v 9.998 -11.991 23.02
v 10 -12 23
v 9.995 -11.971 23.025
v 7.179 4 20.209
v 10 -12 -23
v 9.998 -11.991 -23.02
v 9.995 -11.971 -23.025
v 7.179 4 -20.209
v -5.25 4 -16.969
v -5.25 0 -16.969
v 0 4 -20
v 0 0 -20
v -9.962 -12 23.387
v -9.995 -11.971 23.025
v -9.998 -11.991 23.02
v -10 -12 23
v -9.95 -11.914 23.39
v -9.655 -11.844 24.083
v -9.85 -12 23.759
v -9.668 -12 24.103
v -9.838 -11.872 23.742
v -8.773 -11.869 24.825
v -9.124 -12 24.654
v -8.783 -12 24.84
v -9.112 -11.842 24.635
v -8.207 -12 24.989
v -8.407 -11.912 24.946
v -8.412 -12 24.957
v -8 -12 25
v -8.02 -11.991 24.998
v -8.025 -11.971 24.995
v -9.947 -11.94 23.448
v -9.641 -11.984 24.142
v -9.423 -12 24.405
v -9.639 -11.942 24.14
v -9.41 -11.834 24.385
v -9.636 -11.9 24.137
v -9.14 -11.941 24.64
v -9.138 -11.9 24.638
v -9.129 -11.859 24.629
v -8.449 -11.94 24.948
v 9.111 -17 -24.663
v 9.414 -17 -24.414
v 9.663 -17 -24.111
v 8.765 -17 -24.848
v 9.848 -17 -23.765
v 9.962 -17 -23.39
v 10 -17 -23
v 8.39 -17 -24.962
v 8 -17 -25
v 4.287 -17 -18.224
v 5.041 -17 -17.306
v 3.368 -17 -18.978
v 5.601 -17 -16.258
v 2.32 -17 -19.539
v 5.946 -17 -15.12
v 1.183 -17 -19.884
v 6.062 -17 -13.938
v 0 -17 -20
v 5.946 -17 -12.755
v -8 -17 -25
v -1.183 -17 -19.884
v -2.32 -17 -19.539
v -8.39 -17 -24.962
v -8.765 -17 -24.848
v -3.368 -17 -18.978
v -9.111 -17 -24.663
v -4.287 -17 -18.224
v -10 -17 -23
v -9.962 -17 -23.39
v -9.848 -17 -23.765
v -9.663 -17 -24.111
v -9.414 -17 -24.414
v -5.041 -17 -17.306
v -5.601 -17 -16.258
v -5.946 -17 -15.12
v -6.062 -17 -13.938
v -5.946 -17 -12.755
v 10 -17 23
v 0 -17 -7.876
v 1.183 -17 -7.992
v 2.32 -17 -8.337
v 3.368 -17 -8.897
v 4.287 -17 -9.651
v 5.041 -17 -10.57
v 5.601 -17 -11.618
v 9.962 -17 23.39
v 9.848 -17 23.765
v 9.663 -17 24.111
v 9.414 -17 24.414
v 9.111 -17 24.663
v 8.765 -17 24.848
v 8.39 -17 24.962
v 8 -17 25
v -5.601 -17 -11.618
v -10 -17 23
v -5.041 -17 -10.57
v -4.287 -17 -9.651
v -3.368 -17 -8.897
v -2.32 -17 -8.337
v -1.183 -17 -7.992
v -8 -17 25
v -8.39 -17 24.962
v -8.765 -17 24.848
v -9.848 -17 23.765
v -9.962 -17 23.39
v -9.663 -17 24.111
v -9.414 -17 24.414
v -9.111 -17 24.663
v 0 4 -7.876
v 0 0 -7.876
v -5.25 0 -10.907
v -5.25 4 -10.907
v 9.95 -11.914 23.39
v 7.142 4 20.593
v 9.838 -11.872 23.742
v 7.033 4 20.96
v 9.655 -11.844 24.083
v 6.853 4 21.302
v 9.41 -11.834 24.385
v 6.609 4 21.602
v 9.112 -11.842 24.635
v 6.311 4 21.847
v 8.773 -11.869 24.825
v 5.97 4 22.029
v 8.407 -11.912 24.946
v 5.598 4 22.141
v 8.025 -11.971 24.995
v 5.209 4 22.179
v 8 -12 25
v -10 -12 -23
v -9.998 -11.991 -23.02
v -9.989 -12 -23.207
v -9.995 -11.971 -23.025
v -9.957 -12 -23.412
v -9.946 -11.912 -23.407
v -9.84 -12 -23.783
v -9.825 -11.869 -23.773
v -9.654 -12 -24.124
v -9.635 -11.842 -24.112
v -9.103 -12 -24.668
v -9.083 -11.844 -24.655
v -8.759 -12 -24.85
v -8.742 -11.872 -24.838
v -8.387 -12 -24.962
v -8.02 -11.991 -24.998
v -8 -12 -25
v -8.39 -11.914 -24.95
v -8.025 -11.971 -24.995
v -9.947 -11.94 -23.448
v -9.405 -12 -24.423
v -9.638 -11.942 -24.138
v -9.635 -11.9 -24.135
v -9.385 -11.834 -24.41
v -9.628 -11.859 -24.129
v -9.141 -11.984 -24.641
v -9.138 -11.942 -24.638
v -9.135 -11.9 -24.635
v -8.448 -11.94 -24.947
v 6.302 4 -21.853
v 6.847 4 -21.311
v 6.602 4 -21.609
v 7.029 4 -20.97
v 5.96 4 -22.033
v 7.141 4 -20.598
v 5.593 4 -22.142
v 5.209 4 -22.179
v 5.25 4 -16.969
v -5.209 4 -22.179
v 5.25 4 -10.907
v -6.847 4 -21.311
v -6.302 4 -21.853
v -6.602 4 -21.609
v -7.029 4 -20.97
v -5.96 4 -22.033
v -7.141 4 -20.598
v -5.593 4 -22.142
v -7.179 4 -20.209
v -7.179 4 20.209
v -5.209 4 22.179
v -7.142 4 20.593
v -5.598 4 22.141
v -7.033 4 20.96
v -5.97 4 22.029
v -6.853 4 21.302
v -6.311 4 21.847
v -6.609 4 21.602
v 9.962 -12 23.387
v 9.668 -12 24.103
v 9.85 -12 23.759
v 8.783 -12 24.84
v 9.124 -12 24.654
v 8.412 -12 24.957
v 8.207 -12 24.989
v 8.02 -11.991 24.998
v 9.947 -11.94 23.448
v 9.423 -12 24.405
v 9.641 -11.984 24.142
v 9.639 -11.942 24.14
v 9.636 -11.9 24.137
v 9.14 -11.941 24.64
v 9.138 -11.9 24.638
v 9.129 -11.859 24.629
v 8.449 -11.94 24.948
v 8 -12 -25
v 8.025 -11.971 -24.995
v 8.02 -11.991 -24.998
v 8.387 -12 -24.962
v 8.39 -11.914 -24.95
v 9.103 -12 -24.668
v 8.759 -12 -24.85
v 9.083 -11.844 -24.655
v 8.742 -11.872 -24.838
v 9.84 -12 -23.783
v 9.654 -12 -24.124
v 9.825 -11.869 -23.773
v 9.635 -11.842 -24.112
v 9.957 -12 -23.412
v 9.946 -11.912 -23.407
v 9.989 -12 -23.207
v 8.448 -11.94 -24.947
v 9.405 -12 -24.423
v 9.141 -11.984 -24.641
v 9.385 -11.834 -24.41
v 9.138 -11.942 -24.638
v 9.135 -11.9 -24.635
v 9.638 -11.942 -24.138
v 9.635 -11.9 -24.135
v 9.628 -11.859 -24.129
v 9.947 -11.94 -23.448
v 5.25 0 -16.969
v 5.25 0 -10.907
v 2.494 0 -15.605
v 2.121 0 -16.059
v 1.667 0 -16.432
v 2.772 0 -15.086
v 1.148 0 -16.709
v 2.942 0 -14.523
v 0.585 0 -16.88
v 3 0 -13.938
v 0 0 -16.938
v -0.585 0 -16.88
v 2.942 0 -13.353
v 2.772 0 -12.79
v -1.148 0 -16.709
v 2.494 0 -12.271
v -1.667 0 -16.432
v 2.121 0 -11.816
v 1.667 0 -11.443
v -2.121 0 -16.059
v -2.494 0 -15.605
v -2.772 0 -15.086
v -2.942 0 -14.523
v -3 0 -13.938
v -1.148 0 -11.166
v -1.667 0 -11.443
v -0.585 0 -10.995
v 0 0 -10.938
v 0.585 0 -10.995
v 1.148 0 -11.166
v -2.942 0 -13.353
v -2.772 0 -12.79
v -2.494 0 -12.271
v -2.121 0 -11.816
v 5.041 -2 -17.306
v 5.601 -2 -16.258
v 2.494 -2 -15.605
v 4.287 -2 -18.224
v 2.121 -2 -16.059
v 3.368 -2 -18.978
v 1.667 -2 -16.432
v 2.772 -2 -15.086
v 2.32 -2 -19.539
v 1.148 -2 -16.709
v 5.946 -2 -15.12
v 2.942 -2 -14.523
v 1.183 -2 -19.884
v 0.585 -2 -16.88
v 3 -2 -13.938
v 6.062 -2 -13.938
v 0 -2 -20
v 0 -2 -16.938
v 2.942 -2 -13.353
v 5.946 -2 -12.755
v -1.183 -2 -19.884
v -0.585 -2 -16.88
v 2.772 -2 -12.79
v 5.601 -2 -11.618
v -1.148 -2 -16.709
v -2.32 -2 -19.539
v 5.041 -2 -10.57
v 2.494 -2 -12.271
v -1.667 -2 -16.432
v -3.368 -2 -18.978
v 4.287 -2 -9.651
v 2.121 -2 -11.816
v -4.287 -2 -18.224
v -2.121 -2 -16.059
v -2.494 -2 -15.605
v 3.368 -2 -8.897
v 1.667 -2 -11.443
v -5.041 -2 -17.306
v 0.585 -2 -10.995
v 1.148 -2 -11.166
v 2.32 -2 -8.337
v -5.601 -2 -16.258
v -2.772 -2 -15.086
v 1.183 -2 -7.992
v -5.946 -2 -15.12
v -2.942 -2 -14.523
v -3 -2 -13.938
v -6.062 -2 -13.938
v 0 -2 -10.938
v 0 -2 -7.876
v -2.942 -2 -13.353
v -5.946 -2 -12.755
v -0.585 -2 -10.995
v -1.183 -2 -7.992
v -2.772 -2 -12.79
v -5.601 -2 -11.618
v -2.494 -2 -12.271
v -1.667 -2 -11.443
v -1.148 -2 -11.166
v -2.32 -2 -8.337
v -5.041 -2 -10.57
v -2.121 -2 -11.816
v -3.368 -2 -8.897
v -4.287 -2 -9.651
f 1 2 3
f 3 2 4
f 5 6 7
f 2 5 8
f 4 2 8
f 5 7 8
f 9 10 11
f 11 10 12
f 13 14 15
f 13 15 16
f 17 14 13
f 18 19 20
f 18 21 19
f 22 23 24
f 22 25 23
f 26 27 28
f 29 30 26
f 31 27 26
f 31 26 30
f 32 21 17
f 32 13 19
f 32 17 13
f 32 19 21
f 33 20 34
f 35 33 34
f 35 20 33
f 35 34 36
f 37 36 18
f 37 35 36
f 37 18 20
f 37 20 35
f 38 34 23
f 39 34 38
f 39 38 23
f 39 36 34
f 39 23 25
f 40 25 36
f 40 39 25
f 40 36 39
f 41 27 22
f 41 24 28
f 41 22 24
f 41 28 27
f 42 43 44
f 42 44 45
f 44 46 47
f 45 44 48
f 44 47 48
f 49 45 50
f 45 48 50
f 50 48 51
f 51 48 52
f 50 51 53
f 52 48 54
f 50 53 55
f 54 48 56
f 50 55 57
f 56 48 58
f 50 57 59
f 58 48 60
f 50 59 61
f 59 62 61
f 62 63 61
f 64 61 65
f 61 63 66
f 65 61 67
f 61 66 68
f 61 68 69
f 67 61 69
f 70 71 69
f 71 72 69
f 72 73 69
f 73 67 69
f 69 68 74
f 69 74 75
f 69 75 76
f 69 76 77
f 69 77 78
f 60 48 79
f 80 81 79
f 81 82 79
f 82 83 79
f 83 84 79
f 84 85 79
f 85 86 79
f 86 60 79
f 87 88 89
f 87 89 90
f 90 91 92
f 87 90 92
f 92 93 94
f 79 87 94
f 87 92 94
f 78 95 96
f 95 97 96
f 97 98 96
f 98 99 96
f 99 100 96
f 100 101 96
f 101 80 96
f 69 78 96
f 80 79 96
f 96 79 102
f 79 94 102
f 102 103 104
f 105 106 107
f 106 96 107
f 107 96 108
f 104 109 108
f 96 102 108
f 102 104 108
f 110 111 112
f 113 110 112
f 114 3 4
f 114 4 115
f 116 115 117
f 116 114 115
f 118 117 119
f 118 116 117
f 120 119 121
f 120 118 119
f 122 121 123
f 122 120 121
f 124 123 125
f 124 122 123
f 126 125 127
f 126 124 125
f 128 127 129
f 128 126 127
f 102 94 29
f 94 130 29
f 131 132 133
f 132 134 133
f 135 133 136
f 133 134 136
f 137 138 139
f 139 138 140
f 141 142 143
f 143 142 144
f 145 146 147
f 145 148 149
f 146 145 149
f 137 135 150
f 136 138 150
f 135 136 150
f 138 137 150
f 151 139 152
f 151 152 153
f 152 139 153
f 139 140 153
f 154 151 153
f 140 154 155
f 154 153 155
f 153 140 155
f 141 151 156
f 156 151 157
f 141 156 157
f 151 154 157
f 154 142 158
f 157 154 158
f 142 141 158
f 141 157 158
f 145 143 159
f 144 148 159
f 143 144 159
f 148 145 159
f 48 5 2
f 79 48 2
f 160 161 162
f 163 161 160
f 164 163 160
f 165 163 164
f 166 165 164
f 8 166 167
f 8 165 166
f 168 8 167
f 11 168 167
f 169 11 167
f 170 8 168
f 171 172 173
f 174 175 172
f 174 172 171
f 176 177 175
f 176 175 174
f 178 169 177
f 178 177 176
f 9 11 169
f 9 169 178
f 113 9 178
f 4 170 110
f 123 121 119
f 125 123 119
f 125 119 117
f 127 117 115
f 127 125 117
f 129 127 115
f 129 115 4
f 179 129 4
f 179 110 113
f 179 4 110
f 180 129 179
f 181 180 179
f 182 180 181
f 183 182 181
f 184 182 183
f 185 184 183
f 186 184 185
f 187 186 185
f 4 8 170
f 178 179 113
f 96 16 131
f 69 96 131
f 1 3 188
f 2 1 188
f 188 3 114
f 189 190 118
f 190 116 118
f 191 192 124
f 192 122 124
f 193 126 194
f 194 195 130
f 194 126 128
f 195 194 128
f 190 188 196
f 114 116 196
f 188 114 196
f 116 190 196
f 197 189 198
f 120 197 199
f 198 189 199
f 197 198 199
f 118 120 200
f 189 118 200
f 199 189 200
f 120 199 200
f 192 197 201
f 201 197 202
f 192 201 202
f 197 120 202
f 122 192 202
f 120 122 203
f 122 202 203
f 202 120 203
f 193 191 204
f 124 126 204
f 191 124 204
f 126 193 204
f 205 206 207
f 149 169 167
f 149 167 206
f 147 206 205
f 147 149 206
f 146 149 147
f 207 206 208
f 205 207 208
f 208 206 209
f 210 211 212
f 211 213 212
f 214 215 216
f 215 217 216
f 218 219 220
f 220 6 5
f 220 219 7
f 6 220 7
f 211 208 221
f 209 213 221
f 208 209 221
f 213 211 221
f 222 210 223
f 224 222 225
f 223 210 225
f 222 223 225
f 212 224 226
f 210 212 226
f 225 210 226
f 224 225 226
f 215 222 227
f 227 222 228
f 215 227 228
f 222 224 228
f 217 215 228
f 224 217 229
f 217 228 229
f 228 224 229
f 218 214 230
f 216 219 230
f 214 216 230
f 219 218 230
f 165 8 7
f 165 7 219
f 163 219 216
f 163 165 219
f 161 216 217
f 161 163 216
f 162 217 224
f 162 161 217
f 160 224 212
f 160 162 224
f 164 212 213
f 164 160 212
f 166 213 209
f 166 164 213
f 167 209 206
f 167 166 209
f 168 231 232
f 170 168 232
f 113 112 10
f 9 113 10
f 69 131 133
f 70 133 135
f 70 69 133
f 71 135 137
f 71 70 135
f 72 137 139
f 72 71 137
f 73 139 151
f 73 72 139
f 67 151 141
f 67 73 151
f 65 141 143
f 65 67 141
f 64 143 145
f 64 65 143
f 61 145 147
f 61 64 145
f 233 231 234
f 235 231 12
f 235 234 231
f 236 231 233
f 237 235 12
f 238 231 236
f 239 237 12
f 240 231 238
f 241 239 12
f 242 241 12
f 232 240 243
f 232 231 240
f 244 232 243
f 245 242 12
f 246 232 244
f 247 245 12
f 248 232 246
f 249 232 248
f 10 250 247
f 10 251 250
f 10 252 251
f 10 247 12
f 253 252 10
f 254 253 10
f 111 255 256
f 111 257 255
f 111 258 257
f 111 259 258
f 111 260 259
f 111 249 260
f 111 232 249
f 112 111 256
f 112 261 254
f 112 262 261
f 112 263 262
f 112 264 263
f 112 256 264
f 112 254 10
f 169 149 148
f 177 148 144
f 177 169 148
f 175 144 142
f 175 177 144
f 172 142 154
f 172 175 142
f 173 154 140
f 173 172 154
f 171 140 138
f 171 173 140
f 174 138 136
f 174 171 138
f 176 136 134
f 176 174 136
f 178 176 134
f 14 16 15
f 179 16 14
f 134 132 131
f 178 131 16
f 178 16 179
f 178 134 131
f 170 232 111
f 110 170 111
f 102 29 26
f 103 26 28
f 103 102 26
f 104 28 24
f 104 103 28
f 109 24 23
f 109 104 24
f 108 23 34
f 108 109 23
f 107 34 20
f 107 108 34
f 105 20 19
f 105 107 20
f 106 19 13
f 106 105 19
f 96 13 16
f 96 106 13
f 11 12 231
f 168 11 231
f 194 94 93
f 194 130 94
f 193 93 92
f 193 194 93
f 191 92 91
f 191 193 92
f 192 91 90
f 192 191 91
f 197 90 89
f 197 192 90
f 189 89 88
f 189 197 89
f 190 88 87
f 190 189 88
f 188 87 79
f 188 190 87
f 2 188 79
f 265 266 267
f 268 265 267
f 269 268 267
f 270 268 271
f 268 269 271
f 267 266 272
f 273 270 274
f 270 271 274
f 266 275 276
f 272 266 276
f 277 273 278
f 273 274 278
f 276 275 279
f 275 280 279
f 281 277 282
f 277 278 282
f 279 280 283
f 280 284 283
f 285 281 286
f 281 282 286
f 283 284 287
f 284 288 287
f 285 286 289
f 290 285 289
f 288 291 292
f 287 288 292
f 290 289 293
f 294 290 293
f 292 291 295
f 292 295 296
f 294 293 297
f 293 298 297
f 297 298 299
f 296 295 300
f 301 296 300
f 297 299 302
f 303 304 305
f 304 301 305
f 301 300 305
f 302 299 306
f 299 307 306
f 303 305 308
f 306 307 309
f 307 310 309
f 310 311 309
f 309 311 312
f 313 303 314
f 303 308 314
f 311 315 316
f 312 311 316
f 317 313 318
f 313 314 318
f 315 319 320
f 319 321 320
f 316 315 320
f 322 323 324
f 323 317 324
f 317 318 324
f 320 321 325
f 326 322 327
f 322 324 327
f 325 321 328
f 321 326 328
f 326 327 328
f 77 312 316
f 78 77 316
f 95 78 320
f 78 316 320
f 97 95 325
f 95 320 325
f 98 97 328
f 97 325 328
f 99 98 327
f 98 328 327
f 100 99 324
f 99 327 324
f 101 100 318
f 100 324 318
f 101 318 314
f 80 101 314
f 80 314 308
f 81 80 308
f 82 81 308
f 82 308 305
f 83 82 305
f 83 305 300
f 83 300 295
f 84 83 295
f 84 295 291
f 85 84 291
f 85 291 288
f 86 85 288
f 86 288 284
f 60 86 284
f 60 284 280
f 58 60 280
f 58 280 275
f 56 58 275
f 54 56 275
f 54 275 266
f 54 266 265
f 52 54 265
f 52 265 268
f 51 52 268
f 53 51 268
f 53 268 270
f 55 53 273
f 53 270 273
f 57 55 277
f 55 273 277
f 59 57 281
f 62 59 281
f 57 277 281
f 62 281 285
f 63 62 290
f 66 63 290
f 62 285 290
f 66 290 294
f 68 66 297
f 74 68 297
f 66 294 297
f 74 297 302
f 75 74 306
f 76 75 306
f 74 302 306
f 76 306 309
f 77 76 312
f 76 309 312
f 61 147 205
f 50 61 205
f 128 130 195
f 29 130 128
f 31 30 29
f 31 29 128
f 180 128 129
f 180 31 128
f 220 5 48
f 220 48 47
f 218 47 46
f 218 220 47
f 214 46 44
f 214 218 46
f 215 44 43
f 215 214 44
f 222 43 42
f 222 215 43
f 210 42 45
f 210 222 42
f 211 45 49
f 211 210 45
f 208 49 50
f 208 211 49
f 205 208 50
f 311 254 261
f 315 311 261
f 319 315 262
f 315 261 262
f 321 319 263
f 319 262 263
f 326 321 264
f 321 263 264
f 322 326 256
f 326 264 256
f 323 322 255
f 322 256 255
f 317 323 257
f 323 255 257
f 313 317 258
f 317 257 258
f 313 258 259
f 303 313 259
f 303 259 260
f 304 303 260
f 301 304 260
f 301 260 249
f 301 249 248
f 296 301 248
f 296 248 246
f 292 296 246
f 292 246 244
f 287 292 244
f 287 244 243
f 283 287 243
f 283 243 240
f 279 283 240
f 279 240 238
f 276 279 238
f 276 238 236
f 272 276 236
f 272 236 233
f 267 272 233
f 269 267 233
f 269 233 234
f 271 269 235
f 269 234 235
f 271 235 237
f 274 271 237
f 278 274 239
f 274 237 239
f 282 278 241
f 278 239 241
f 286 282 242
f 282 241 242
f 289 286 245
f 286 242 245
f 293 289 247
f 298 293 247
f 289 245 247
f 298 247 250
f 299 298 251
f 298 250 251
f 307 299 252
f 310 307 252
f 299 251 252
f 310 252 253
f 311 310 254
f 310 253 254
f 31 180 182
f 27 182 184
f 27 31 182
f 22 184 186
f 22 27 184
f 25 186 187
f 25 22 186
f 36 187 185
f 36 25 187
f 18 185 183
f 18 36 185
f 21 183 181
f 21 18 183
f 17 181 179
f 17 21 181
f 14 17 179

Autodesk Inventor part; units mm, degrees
ref_plane "YZ Plane" through (0, 0, 0) normal (1, 0, 0) x (0, 1, 0)
ref_plane "XZ Plane" through (0, 0, 0) normal (0, 1, 0) x (-1, 0, 0)
ref_plane "XY Plane" through (0, 0, 0) normal (0, 0, 1) x (1, 0, 0)
sketch "Skizze1" plane through (0, 0, 0) normal (0, 1, 0) x (-1, 0, 0)
  line L0 (-10, 25) -> (10, 25)
  line L1 (10, 25) -> (10, -25)
  line L2 (10, -25) -> (-10, -25)
  line L3 (-10, -25) -> (-10, 25)
  line L4 (-10, 25) -> (10, -25) construction
  line L5 (10, 25) -> (-10, -25) construction
  line L6 (0, -20) -> (-5.25, -16.9689)
  line L7 (-5.25, -16.9689) -> (-5.25, -10.9067)
  line L8 (-5.25, -10.9067) -> (0, -7.8756)
  line L9 (0, -7.8756) -> (5.25, -10.9067)
  line L10 (5.25, -10.9067) -> (5.25, -16.9689)
  line L11 (5.25, -16.9689) -> (0, -20)
  circle A0 centre (0, -13.9378) radius 3
  circle A1 centre (0, -13.9378) radius 6.0622
  point P0 (0, 0)
  point P1 (0, 0)
  dimension "d0" = 10.5
  dimension "d1" = 20
  dimension "d2" = 50
  dimension "d3" = 5
  dimension "d6" = 6
extrude "Extrusion1" add sketch "Skizze1" against normal blind 2 contours L0 L1 L2 L3 | A1 L6 | L6 L7 L8 L9 L10 L11 | L11 A1 | A1 L7 | L10 A1 | A1 L8 | L9 A1
extrude "Extrusion2" add sketch "Skizze1" along normal blind 4 contours L0 L1 L2 L3 | A1 L6 | L11 A1 | A1 L7 | L10 A1 | A1 L8 | L9 A1
extrude "Extrusion3" add sketch "Skizze1" against normal blind 17 contours L0 L1 L2 L3
sketch "Skizze2" plane through (0, 0, 0) normal (1, 0, 0) x (0, 1, 0)
  line L0 (0, -10.9378) -> (-2, -10.9378) projected
  line L1 (-2, -10.9378) -> (-2, -7.8756) projected
  line L2 (-2, -7.8756) -> (-17, -7.8756) projected
  line L3 (-17, -7.8756) -> (-17, 25) projected
  line L4 (-17, 25) -> (4, 25) projected
  line L5 (4, 25) -> (4, -7.8756) projected
  line L6 (4, -7.8756) -> (0, -7.8756) projected
  line L7 (0, -7.8756) -> (0, -10.9378) projected
  line L8 (-2, -16.9378) -> (0, -16.9378) projected
  line L9 (0, -16.9378) -> (0, -20) projected
  line L10 (0, -20) -> (4, -20) projected
  line L11 (4, -20) -> (4, -25) projected
  line L12 (4, -25) -> (-17, -25) projected
  line L13 (-17, -25) -> (-17, -20) projected
  line L14 (-17, -20) -> (-2, -20) projected
  line L15 (-2, -20) -> (-2, -16.9378) projected
  line L16 (-12, 25) -> (4, 22.1788)
  line L17 (4, 25) -> (4, 22.1788)
  line L18 (4, 25) -> (-12, 25)
  line L19 (4, -22.1788) -> (4, -25)
  line L20 (4, -22.1788) -> (-12, -25)
  line L21 (4, -25) -> (-12, -25)
  point P0 (0, 0)
  dimension "d12" = 5
  dimension "d13" = 10
  dimension "d14" = 10
extrude "Extrusion4" cut sketch "Skizze2" along normal through all both and the other way through all contours L16 L4 L5 | L11 L12 L20
sketch "Skizze3" plane through (0, 0, 0) normal (0, 0, 1) x (1, 0, 0)
  line L0 (-10, 4) -> (10, 4) projected
  line L1 (10, 4) -> (10, -17) projected
  line L2 (10, -17) -> (-10, -17) projected
  line L3 (-10, -17) -> (-10, 4) projected
  line L4 (-7.1788, 4) -> (-10, 4)
  line L5 (-10, -12) -> (-10, 4)
  line L6 (-10, -12) -> (-7.1788, 4)
  line L7 (7.1788, 4) -> (10, 4)
  line L8 (10, 4) -> (10, -12)
  line L9 (10, -12) -> (7.1788, 4)
  point P0 (0, 0)
  dimension "d17" = 10
  dimension "d18" = 10
  dimension "d19" = 5
extrude "Extrusion5" cut sketch "Skizze3" along normal through all both and the other way through all contours L0 L6 L3 | L0 L1 L9
fillet "Rundung1" radius 2 8 edges at (8.5894, -4, 23.5894) (10, -14.5, 25) (-8.5894, -4, 23.5894) (-10, -14.5, 25) (-8.5894, -4, -23.5894) (-10, -14.5, -25) (8.5894, -4, -23.5894) (10, -14.5, -25)
equation "\"d18\" = d17"
equation "\"d19\" = d12"
properties part number "Verschluss_Knauf"
